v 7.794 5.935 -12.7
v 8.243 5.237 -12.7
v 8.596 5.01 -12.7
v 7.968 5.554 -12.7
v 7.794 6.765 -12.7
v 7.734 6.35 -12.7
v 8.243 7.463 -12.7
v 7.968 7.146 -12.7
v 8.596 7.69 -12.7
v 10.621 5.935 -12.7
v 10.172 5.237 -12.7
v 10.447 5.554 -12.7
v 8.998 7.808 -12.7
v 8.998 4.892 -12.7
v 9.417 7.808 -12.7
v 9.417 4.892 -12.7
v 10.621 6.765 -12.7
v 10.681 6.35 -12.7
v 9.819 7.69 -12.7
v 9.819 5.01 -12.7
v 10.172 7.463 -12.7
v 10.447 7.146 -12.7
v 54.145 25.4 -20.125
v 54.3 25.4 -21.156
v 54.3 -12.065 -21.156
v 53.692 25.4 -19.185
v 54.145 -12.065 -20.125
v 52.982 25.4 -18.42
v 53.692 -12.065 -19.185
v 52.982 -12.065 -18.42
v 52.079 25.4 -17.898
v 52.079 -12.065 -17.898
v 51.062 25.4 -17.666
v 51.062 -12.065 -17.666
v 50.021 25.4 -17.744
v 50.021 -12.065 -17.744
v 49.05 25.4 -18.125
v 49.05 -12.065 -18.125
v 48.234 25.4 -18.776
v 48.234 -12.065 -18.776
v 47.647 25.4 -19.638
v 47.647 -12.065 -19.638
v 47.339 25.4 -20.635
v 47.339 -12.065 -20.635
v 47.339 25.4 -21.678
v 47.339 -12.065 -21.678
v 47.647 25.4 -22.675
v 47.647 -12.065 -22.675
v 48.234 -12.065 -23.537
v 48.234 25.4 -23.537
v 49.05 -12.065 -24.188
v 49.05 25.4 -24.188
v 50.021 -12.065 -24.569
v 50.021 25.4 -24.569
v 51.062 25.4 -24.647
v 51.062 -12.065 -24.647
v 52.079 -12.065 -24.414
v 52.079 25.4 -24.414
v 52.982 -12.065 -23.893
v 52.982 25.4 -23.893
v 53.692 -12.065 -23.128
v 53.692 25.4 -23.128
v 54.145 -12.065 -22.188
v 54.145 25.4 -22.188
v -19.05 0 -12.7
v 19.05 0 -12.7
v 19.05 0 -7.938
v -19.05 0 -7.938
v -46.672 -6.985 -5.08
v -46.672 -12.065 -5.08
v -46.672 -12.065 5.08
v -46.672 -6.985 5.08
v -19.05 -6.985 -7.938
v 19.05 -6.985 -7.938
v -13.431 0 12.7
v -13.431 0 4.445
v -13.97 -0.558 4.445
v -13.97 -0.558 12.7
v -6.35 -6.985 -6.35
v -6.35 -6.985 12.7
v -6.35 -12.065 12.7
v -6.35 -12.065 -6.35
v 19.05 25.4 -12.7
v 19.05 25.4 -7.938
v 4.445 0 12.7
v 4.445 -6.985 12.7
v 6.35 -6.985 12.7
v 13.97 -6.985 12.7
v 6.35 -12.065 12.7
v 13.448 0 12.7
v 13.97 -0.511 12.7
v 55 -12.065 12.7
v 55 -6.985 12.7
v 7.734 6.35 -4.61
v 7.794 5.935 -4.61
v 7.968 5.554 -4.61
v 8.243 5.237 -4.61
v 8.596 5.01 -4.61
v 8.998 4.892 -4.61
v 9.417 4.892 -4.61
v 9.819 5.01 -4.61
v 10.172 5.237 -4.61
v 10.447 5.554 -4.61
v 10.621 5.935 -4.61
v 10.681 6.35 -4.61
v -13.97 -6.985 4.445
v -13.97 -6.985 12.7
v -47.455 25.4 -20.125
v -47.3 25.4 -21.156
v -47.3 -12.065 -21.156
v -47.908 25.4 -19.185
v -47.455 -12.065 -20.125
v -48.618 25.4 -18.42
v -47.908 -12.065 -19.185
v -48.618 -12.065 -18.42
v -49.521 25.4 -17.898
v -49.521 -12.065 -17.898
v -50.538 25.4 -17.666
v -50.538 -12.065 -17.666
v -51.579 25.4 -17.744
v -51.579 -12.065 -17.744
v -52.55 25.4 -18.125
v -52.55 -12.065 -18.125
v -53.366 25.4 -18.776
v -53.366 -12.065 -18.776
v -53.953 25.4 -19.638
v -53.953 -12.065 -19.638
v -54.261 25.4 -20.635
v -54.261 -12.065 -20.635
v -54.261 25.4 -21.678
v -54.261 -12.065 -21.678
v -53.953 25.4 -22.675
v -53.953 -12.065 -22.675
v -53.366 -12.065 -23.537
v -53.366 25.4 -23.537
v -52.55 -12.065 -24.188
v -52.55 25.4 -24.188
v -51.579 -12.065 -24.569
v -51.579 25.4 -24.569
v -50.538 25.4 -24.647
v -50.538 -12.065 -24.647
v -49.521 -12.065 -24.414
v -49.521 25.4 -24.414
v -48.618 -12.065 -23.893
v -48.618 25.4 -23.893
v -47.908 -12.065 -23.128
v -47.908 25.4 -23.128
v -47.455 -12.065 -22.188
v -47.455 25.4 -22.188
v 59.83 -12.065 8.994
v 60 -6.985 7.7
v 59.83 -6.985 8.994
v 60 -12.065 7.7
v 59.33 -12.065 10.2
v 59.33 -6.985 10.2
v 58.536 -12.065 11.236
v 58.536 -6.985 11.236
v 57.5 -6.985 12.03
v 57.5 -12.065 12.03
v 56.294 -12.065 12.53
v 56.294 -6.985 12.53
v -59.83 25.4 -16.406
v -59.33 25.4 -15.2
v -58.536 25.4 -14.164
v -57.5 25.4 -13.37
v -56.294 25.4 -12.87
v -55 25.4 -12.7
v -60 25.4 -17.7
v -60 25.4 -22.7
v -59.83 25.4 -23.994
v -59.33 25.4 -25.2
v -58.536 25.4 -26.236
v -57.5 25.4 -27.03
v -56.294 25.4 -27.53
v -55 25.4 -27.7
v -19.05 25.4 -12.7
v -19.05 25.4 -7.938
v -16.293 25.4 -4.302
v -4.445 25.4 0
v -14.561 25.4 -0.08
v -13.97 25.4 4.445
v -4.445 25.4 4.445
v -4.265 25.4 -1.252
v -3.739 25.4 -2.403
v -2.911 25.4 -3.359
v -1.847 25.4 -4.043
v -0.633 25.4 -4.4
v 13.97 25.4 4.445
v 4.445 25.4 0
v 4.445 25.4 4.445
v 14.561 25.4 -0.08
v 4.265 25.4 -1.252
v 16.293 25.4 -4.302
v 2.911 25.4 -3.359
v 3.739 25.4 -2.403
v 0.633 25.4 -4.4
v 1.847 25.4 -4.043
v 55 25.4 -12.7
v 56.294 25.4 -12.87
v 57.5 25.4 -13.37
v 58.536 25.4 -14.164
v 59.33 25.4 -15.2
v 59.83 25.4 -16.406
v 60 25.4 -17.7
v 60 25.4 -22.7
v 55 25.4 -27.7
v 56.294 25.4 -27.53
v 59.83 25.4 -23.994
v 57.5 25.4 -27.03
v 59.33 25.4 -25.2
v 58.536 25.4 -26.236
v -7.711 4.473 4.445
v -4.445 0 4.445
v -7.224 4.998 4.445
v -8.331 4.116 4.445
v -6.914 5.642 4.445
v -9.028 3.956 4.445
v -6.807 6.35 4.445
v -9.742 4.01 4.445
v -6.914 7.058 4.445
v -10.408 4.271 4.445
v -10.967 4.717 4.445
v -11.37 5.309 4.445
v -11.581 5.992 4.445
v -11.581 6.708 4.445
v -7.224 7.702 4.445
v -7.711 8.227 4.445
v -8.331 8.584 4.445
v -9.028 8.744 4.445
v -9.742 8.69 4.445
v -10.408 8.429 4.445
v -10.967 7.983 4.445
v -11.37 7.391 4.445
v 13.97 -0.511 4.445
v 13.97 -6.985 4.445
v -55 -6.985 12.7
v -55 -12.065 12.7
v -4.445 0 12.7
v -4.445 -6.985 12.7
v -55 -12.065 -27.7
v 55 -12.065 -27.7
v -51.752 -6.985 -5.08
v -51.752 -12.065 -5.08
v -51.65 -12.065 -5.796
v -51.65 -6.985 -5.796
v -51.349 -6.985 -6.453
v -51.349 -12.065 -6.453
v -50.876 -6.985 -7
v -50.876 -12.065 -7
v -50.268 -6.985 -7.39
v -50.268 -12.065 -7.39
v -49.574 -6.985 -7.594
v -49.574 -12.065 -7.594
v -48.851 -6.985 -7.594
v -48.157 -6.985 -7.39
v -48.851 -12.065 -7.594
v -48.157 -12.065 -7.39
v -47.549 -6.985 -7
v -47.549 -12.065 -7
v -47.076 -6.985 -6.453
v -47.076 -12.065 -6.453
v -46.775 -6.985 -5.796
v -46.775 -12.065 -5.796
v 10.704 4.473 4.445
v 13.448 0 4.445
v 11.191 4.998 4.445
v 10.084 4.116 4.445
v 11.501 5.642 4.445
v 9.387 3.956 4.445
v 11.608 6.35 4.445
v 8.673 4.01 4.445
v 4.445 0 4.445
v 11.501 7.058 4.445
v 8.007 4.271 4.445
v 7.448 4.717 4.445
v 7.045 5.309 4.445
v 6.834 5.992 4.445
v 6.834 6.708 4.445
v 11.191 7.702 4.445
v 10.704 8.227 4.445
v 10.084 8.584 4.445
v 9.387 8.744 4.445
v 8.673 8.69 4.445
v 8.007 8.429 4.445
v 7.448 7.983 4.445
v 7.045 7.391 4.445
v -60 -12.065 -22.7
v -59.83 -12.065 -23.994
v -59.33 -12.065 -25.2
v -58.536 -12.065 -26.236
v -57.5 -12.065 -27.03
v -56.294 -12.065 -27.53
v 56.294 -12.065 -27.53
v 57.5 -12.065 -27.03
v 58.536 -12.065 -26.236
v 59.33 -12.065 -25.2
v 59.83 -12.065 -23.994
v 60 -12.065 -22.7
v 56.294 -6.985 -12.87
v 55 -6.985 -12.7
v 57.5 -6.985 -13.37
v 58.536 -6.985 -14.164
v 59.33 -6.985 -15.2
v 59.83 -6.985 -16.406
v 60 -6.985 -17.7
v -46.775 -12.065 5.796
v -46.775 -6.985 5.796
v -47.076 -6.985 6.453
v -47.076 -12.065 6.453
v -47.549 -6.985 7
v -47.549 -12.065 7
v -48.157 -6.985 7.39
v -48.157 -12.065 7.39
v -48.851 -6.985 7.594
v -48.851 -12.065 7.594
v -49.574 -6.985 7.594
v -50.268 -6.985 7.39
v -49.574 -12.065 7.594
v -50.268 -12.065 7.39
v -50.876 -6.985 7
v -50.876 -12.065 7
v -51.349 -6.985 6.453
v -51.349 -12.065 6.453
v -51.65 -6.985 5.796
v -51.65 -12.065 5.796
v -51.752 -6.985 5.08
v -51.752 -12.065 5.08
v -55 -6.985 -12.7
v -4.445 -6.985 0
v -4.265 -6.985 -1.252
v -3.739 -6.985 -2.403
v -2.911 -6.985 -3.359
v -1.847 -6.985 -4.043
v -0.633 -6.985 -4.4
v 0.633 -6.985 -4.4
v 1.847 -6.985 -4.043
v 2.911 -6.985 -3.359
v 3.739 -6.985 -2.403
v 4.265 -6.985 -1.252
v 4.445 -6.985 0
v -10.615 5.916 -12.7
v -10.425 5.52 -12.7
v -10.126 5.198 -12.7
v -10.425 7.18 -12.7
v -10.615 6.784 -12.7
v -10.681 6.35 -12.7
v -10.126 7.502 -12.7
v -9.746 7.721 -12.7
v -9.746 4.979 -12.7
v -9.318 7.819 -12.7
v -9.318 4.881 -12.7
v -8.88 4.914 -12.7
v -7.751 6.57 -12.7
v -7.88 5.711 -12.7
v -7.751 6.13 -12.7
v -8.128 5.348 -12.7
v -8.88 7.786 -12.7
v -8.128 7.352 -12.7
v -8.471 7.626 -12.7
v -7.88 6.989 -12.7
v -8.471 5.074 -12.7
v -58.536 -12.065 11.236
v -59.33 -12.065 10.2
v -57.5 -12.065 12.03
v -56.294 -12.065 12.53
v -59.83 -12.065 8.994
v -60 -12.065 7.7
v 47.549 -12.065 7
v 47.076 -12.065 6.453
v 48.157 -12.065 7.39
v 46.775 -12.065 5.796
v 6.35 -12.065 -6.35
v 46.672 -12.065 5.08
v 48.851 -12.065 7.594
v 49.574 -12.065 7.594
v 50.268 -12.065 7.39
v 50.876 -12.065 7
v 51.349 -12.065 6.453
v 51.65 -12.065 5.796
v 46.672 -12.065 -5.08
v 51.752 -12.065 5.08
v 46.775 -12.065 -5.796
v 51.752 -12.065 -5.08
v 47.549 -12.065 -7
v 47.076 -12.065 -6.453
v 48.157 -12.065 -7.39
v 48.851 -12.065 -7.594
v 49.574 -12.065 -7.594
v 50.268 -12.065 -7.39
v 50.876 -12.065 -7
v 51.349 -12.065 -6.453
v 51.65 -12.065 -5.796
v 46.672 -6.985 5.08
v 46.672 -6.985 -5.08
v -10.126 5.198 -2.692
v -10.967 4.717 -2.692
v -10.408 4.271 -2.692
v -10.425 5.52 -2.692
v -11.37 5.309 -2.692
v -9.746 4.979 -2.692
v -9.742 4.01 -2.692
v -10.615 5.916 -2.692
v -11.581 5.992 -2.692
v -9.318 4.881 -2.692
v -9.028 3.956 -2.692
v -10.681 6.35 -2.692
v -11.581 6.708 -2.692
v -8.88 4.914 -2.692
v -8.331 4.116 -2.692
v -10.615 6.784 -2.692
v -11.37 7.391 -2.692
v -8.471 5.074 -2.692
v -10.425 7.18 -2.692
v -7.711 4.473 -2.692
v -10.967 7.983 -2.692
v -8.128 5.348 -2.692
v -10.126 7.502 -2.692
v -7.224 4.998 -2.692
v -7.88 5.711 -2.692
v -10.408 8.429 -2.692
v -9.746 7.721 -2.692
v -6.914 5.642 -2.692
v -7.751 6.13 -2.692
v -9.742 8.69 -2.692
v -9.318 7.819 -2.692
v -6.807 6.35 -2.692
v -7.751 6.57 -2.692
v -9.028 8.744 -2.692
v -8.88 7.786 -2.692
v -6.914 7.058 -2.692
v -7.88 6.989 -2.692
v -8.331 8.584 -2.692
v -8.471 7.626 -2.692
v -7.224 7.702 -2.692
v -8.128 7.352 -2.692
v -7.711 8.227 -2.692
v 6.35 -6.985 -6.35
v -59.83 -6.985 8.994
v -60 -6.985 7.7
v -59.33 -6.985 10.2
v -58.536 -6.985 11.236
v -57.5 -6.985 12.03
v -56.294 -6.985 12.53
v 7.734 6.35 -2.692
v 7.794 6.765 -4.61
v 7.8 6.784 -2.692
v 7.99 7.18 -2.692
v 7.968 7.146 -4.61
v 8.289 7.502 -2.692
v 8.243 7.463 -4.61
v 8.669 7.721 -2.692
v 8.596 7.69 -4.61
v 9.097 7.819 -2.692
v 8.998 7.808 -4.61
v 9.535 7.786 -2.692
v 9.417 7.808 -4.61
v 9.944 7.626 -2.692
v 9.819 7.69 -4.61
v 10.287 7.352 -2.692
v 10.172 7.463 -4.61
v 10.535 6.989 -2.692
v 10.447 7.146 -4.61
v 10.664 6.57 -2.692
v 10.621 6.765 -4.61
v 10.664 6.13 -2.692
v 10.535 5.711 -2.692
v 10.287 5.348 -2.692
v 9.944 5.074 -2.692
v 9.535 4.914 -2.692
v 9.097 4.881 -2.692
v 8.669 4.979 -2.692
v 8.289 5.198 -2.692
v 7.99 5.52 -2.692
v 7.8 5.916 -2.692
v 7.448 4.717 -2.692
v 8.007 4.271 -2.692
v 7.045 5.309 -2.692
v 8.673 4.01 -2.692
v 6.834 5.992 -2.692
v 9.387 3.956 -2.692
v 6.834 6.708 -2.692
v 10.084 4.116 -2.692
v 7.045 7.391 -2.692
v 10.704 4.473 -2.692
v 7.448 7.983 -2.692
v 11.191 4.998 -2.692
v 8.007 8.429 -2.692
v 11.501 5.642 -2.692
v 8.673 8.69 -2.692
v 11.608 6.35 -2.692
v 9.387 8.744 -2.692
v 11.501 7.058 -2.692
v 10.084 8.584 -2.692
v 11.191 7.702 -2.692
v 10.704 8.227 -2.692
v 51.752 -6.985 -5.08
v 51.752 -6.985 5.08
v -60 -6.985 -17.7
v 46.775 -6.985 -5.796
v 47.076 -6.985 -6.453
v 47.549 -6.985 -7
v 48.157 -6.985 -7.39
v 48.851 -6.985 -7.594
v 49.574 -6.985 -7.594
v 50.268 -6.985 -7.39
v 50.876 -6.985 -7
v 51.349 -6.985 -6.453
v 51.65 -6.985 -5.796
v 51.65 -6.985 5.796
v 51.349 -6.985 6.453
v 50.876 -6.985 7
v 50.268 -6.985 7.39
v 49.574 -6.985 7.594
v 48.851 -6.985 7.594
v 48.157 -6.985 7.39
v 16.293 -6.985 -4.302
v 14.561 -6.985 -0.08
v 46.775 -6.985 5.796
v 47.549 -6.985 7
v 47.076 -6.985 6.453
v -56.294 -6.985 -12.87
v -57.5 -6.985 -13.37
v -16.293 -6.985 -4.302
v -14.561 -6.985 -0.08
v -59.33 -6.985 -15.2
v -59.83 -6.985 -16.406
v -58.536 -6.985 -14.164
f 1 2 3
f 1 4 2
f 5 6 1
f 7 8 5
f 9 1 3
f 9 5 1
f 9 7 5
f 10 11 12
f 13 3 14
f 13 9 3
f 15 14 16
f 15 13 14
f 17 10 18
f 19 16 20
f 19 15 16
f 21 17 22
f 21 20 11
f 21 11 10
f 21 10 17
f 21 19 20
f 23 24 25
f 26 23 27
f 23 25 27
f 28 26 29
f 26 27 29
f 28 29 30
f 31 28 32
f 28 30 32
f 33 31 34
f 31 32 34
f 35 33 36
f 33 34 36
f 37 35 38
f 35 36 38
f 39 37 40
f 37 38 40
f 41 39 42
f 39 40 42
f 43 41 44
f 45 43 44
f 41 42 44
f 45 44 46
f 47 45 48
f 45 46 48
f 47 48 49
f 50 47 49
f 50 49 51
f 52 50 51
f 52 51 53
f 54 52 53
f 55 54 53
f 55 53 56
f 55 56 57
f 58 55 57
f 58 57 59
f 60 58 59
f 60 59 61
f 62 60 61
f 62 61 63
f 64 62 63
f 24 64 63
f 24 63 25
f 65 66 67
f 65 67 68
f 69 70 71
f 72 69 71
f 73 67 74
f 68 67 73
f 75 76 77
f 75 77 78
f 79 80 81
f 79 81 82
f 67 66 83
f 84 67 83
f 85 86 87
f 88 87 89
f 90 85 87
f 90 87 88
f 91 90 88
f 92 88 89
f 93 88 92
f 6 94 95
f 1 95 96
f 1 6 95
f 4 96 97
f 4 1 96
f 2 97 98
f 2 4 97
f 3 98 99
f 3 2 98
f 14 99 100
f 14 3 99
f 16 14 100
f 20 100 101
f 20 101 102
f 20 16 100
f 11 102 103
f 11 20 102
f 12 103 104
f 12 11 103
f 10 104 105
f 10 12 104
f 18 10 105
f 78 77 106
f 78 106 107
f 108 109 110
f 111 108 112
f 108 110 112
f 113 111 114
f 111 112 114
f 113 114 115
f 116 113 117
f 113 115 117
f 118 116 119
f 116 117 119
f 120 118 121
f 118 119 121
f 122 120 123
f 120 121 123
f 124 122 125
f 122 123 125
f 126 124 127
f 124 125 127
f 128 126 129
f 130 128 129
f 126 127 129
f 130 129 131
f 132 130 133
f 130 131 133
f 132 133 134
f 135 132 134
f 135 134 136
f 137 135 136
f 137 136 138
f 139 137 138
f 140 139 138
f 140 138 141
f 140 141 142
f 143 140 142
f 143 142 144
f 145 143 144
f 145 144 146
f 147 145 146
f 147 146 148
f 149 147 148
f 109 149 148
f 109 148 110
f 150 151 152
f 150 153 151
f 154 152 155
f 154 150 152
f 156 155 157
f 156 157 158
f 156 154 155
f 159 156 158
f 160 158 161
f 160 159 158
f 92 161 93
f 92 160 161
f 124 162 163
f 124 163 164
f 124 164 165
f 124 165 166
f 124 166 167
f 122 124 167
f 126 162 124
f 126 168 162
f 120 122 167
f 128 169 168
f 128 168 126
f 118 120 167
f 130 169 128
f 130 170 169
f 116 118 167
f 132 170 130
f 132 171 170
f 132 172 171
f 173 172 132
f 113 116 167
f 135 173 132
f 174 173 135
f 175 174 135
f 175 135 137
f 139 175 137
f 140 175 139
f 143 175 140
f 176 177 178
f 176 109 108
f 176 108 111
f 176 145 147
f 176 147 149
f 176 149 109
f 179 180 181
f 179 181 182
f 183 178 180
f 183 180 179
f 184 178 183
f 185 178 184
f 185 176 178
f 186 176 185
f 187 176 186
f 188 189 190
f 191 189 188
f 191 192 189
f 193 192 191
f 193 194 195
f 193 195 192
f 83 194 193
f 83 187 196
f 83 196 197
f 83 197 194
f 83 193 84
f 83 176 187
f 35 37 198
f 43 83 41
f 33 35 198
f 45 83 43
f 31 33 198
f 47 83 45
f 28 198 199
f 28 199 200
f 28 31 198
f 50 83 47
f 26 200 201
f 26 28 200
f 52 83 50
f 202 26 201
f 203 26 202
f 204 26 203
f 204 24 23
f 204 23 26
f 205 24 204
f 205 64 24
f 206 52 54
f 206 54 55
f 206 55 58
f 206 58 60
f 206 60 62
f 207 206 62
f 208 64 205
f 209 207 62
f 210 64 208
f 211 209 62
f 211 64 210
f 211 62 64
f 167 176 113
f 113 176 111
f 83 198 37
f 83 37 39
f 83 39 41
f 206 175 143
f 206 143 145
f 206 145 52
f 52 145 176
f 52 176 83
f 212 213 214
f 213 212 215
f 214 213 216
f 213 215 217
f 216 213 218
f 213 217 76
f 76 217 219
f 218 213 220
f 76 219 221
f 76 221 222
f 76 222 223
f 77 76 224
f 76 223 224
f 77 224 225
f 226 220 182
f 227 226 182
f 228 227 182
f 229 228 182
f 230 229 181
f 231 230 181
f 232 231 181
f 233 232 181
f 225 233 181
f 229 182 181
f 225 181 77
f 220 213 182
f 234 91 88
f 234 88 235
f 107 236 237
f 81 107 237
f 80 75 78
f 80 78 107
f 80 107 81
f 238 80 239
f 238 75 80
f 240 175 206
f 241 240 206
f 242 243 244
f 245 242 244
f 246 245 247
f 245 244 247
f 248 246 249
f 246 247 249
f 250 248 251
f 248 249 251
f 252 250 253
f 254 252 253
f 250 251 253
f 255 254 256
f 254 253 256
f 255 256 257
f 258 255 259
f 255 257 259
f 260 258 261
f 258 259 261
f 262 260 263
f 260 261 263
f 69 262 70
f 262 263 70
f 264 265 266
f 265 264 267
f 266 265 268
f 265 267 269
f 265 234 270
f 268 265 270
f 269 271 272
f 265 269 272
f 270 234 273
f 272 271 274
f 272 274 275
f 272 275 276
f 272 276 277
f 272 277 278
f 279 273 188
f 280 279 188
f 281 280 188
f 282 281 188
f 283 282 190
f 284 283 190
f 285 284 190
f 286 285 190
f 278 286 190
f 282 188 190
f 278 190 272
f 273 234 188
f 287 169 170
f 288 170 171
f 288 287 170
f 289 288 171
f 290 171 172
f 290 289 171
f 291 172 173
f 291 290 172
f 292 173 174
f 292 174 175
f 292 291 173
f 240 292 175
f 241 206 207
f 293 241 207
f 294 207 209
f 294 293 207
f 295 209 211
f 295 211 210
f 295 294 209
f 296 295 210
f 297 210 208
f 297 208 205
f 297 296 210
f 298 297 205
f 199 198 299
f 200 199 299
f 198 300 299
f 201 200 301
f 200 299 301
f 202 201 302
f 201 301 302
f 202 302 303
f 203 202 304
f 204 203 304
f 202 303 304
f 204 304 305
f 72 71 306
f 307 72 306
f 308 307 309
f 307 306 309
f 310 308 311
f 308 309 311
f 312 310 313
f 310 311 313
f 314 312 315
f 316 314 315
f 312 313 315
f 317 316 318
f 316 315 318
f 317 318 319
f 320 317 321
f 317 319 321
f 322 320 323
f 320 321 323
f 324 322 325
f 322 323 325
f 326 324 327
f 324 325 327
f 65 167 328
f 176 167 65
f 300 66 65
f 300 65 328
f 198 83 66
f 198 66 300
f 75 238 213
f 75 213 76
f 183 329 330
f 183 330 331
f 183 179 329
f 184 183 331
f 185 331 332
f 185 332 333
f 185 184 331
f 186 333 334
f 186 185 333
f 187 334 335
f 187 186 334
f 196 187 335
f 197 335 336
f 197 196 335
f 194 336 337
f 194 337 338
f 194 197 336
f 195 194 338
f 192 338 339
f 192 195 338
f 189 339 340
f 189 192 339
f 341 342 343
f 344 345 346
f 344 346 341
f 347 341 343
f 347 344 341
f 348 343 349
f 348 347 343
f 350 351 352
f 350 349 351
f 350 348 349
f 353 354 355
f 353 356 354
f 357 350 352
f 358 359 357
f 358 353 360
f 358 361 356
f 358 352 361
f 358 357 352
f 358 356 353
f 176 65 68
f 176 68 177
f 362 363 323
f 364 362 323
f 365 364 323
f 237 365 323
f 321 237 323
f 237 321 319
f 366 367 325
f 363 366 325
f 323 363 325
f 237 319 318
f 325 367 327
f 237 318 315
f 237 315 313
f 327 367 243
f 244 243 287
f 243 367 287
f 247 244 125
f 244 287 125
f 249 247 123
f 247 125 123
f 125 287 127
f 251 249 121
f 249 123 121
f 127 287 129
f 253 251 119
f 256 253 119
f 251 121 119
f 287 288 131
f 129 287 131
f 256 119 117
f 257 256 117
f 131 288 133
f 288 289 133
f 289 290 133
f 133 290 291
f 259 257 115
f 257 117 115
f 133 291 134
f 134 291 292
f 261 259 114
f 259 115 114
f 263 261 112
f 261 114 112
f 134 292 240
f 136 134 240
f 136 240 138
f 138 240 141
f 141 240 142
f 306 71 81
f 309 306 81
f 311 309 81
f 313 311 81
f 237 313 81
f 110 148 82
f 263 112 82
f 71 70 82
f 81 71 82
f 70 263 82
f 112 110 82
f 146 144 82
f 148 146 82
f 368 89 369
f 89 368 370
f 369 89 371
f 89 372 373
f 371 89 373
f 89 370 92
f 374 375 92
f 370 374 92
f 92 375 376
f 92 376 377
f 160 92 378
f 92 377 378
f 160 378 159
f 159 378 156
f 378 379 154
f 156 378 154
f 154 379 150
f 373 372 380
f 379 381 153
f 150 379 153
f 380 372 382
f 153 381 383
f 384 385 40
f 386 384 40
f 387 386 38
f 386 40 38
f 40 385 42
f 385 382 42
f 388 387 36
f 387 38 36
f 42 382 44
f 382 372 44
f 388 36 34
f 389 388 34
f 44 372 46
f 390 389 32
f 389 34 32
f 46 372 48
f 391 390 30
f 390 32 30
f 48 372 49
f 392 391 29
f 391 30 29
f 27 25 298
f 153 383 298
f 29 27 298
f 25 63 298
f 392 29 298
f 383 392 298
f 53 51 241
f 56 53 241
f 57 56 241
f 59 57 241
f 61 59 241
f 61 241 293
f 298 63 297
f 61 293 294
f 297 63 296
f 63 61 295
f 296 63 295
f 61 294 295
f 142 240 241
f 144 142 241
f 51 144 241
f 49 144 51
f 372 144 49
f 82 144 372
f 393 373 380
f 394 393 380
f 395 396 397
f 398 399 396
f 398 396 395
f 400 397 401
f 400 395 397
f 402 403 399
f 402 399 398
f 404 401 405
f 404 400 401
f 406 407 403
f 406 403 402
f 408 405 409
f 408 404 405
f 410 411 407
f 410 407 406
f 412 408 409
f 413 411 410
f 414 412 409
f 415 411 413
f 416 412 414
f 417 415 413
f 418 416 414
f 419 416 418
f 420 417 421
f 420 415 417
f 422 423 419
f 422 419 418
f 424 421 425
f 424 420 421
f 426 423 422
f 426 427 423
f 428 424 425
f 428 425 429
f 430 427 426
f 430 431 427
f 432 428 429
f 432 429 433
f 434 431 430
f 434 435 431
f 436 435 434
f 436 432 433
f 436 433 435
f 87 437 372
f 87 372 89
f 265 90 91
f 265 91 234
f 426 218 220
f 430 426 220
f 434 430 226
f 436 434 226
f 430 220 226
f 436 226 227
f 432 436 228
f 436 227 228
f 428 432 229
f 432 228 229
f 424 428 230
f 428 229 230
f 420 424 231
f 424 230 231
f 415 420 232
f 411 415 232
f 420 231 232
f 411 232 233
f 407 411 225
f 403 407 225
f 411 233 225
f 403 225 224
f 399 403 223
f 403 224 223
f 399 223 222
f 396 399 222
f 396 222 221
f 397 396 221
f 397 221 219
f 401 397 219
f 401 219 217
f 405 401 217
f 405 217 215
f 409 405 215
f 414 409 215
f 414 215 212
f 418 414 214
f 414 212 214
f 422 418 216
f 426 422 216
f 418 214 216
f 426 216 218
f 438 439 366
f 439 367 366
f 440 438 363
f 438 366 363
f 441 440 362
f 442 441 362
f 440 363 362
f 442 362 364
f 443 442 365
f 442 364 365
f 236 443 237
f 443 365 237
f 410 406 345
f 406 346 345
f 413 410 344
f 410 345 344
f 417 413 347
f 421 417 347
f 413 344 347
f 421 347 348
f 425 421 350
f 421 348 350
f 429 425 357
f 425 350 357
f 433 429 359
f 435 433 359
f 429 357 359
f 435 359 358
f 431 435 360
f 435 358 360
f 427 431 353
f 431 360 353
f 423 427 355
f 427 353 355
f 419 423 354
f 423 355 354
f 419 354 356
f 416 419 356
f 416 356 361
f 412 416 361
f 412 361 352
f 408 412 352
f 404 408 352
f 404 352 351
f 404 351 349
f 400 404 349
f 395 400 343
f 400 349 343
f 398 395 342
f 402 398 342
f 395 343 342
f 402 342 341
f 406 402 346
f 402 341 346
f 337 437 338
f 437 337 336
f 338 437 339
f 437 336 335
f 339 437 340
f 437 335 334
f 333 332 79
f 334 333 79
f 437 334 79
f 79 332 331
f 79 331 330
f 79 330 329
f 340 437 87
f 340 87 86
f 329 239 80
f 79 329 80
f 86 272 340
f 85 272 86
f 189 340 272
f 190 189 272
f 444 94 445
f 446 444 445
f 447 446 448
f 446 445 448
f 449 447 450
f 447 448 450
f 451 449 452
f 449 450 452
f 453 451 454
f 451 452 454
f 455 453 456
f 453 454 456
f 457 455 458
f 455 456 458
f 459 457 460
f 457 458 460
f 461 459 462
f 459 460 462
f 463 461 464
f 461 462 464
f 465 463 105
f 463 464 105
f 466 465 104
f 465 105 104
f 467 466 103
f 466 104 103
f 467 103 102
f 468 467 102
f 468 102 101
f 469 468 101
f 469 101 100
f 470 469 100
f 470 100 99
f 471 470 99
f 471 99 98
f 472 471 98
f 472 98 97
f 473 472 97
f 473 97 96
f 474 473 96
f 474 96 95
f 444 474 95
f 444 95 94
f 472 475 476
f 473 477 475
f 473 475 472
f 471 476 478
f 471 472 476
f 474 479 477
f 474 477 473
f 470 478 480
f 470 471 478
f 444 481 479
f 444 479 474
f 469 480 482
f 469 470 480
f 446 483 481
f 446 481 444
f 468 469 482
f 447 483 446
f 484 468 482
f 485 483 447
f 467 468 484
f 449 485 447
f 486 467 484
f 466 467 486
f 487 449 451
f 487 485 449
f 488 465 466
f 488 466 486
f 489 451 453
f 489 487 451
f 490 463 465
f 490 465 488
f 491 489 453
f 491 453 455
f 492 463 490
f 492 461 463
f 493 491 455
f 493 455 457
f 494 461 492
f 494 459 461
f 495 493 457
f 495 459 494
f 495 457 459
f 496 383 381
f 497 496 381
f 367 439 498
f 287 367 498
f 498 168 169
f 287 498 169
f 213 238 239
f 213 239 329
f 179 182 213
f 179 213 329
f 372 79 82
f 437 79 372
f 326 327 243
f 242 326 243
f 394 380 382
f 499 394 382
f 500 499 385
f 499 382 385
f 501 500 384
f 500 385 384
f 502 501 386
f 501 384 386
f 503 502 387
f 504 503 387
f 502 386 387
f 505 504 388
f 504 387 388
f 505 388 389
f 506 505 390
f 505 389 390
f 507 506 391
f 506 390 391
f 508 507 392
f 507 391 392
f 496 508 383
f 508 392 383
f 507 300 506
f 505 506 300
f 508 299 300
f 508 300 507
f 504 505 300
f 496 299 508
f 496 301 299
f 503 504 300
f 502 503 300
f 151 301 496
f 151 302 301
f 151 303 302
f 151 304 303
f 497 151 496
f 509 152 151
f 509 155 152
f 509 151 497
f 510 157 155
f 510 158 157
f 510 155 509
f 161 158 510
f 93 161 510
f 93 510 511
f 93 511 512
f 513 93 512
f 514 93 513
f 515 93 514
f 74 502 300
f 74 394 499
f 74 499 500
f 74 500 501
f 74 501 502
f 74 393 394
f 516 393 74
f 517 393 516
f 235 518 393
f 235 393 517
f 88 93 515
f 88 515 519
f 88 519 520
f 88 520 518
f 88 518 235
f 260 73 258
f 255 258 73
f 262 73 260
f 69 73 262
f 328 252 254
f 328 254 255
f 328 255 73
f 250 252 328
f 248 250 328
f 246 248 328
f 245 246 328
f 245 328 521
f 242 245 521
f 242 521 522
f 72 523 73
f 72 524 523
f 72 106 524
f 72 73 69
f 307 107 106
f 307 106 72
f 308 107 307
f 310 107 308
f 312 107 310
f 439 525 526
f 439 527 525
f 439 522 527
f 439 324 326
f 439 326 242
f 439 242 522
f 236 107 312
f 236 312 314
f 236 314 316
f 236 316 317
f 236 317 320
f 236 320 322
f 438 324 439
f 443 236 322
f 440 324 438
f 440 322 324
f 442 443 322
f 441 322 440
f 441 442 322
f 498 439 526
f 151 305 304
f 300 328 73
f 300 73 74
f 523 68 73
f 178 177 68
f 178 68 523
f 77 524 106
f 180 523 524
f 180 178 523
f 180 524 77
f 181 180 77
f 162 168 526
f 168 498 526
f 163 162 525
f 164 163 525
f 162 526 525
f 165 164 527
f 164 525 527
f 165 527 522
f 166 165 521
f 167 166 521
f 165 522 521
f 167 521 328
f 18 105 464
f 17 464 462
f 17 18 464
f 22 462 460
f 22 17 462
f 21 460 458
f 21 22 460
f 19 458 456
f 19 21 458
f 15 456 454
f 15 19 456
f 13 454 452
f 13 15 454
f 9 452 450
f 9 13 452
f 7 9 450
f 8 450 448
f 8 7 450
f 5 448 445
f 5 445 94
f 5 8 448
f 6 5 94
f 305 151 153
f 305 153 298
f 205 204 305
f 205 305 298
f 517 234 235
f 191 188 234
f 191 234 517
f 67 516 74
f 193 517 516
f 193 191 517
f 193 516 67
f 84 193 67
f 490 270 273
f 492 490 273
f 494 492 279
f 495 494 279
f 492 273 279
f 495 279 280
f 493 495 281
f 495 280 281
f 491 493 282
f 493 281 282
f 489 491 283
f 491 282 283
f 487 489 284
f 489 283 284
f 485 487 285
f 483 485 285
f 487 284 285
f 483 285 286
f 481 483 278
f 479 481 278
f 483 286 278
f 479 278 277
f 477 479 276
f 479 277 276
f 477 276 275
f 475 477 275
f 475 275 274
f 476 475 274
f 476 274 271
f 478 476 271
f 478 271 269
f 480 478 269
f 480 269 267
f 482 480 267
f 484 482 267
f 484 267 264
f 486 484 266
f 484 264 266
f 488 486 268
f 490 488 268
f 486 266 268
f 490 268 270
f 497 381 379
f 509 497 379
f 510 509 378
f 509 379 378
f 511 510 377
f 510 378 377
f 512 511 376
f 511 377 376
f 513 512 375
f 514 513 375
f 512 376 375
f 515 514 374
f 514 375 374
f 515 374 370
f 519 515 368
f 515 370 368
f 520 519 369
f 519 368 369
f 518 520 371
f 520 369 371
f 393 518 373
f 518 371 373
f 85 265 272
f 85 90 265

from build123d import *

# Parameters (mm, degrees)
SKETCH1_W                  = 38.1
SKETCH1_H                  = 25.4
BOSS_EXTRUDE1_DEPTH        = 25.0825
CUT_EXTRUDE3_DEPTH         = 26.4
CUT_EXTRUDE4_DEPTH         = 26.4
CUT_EXTRUDE5_DEPTH         = 26.4
BOSS_EXTRUDE2_DEPTH        = 6.985
BOSS_EXTRUDE3_DEPTH        = 5.08
SKETCH29_W                 = 19.05
SKETCH29_H                 = 5.08
CUT_EXTRUDE6_DEPTH         = 1.905
SKETCH30_W                 = 19.05
SKETCH30_H                 = 5.08
CUT_EXTRUDE7_DEPTH         = 1.905
CUT_EXTRUDE10_REACH        = 39.465
CUT_EXTRUDE11_REACH        = 39.465
SKETCH77_W                 = 1.4732
SKETCH77_H                 = 16.0274
M2_5_CLEARANCE_HOLE1_D     = 2.9464
M2_5_CLEARANCE_HOLE1_DEPTH = 25.0825
CHAMFER1_SIZE              = 0.511100582
CHAMFER1_SIZE2             = 0.522104304
CHAMFER2_SIZE              = 0.558247665
CHAMFER2_SIZE2             = 0.538663646
SKETCH80_W                 = 38.1
SKETCH80_H                 = 25.4
CUT_EXTRUDE13_DEPTH        = 7.9375
SKETCH81_W                 = 120
SKETCH81_H                 = 15
BOSS_EXTRUDE4_DEPTH        = 37.465
SKETCH82_R                 = 3.5
CUT_EXTRUDE14_DEPTH        = 38.465
FILLET3_R                  = 5
FILLET4_R                  = 5
FILLET5_R                  = 5
SKETCH83_R                 = 2.4003
CUT_EXTRUDE15_DEPTH        = 7.1374


with BuildPart() as part:
    # Sketch1 → Boss-Extrude1 (new body)
    with BuildSketch(Plane(origin=(0, 0, -20.6375), x_dir=(-1, 0, 0), z_dir=(0, 0, -1))):
        with Locations((0, 12.7)):
            Rectangle(SKETCH1_W, SKETCH1_H)
    extrude(amount=-BOSS_EXTRUDE1_DEPTH)

    # Sketch18 → Cut-Extrude3 (cut, through all)
    with BuildSketch(Plane(origin=(0, 0, 0), x_dir=(-1, 0, 0), z_dir=(0, -1, 0))):
        with BuildLine():
            Line((13.97, -4.445), (19.05, -4.445))
            Line((19.05, -4.445), (19.05, 7.9375))
            ThreePointArc((19.05, 7.9375), (15.289364951, 2.247023353), (13.97, -4.445))
        make_face()
    extrude(amount=-CUT_EXTRUDE3_DEPTH, mode=Mode.SUBTRACT)

    # Sketch19 → Cut-Extrude4 (cut, through all)
    with BuildSketch(Plane.XZ):
        with BuildLine():
            Line((4.445, 4.445), (-4.445, 4.445))
            Line((-4.445, 4.445), (-4.445, 0))
            ThreePointArc((-4.445, 0), (0, -4.445), (4.445, 0))
            Line((4.445, 0), (4.445, 4.445))
        make_face()
    extrude(amount=-CUT_EXTRUDE4_DEPTH, mode=Mode.SUBTRACT)

    # Sketch20 → Cut-Extrude5 (cut, through all)
    with BuildSketch(Plane.XZ):
        with BuildLine():
            Line((19.05, -7.9375), (19.05, 4.445))
            Line((19.05, 4.445), (13.97, 4.445))
            ThreePointArc((13.97, 4.445), (15.289364951, -2.247023353), (19.05, -7.9375))
        make_face()
    extrude(amount=-CUT_EXTRUDE5_DEPTH, mode=Mode.SUBTRACT)

    # Sketch21 → Boss-Extrude2 (add)
    with BuildSketch(Plane.XZ):
        with BuildLine():
            Line((4.445, 0), (4.445, 12.7))
            Line((4.445, 12.7), (13.97, 12.7))
            Line((13.97, 12.7), (13.97, 4.445))
            ThreePointArc((13.97, 4.445), (15.289364951, -2.247023353), (19.05, -7.9375))
            Line((19.05, -7.9375), (-19.05, -7.9375))
            ThreePointArc((-19.05, -7.9375), (-15.289364951, -2.247023353), (-13.97, 4.445))
            Line((-13.97, 4.445), (-13.97, 12.7))
            Line((-13.97, 12.7), (-4.445, 12.7))
            Line((-4.445, 12.7), (-4.445, 0))
            ThreePointArc((-4.445, 0), (0, -4.445), (4.445, 0))
        make_face()
    extrude(amount=BOSS_EXTRUDE2_DEPTH)

    # Sketch22 → Boss-Extrude3 (add)
    with BuildSketch(Plane.XZ.offset(6.985)):
        Polygon((-4.445, -6.35), (4.445, -6.35), (4.445, 12.7), (60, 12.7), (60, -12.7), (-60, -12.7), (-60, 12.7), (-4.445, 12.7), align=None)
    extrude(amount=BOSS_EXTRUDE3_DEPTH)

    # Sketch29 → Cut-Extrude6 (cut)
    with BuildSketch(Plane.ZY.offset(-4.445)):
        with Locations((3.175, -9.525)):
            Rectangle(SKETCH29_W, SKETCH29_H)
    extrude(amount=-CUT_EXTRUDE6_DEPTH, mode=Mode.SUBTRACT)

    # Sketch30 → Cut-Extrude7 (cut)
    with BuildSketch(Plane(origin=(-4.445, 0, 0), x_dir=(0, 0, -1), z_dir=(1, 0, 0))):
        with Locations((-3.175, -9.525)):
            Rectangle(SKETCH30_W, SKETCH30_H)
    extrude(amount=-CUT_EXTRUDE7_DEPTH, mode=Mode.SUBTRACT)

    # Sketch48 → Cut-Extrude10 (cut, up to next)
    with BuildSketch(Plane(origin=(0, -12.065, 0), x_dir=(-1, 0, 0), z_dir=(0, -1, 0)), mode=Mode.PRIVATE) as cut_extrude10_sk1:
        with BuildLine():
            Line((-51.7525, 5.08), (-51.7525, -5.08))
            ThreePointArc((-51.7525, -5.08), (-49.2125, -7.62), (-46.6725, -5.08))
            Line((-46.6725, -5.08), (-46.6725, 5.08))
            ThreePointArc((-46.6725, 5.08), (-49.2125, 7.62), (-51.7525, 5.08))
        make_face()
    cut_extrude10_tool1 = extrude(cut_extrude10_sk1.sketch, amount=-CUT_EXTRUDE10_REACH, mode=Mode.PRIVATE) & part.part
    add(cut_extrude10_tool1.solids().sort_by_distance((49.2125, -12.065, 0))[0], mode=Mode.SUBTRACT)

    # Sketch57 → Cut-Extrude11 (cut, up to next)
    with BuildSketch(Plane(origin=(0, -12.065, 0), x_dir=(-1, 0, 0), z_dir=(0, -1, 0)), mode=Mode.PRIVATE) as cut_extrude11_sk1:
        with BuildLine():
            Line((46.6725, 5.08), (46.6725, -5.08))
            ThreePointArc((46.6725, -5.08), (49.2125, -7.62), (51.7525, -5.08))
            Line((51.7525, -5.08), (51.7525, 5.08))
            ThreePointArc((51.7525, 5.08), (49.2125, 7.62), (46.6725, 5.08))
        make_face()
    cut_extrude11_tool1 = extrude(cut_extrude11_sk1.sketch, amount=-CUT_EXTRUDE11_REACH, mode=Mode.PRIVATE) & part.part
    add(cut_extrude11_tool1.solids().sort_by_distance((-49.2125, -12.065, 0))[0], mode=Mode.SUBTRACT)

    # Sketch77 → Cut-Revolve2 (revolve, cut)
    with BuildSketch(Plane(origin=(0, 6.35, 0), x_dir=(1, 0, 0), z_dir=(0, 1, 0))):
        with Locations((9.9441, 12.6238)):
            Rectangle(SKETCH77_W, SKETCH77_H)
    revolve(axis=Axis((9.2075, 6.35, -20.6375), (0, 0, 1)), mode=Mode.SUBTRACT)

    # M2.5 Clearance Hole1
    with Locations(Plane.XY.offset(4.445)):
        with Locations((9.2075, 6.35), (-9.2075, 6.35)):
            Hole(M2_5_CLEARANCE_HOLE1_D / 2, depth=M2_5_CLEARANCE_HOLE1_DEPTH)

    # Chamfer1
    chamfer1_edges = [part.edges().sort_by_distance(p)[0] for p in [
        (13.97, 0, 8.5725),
    ]]
    chamfer1_side = [part.faces().sort_by_distance(p)[0] for p in [
        (13.97, -3.4925, 8.5725),
    ]]
    chamfer(chamfer1_edges, length=CHAMFER1_SIZE, length2=CHAMFER1_SIZE2, reference=chamfer1_side[0])

    # Chamfer2
    chamfer2_edges = [part.edges().sort_by_distance(p)[0] for p in [
        (-13.97, 0, 8.5725),
    ]]
    chamfer2_side = [part.faces().sort_by_distance(p)[0] for p in [
        (-13.97, -3.4925, 8.5725),
    ]]
    chamfer(chamfer2_edges, length=CHAMFER2_SIZE, length2=CHAMFER2_SIZE2, reference=chamfer2_side[0])

    # Sketch80 → Cut-Extrude13 (cut)
    with BuildSketch(Plane(origin=(0, 0, -20.6375), x_dir=(-1, 0, 0), z_dir=(0, 0, -1))):
        with Locations((0, 12.7)):
            Rectangle(SKETCH80_W, SKETCH80_H)
    extrude(amount=-CUT_EXTRUDE13_DEPTH, mode=Mode.SUBTRACT)

    # Sketch81 → Boss-Extrude4 (add)
    with BuildSketch(Plane(origin=(0, 25.4, 0), x_dir=(1, 0, 0), z_dir=(0, 1, 0))):
        with Locations((0, 20.2)):
            Rectangle(SKETCH81_W, SKETCH81_H)
    extrude(amount=-BOSS_EXTRUDE4_DEPTH)

    # Sketch82 → Cut-Extrude14 (cut, through all)
    with BuildSketch(Plane.XZ.offset(12.065)):
        with Locations((-50.8, -21.156433146)):
            Circle(SKETCH82_R)
        with Locations((50.8, -21.156433146)):
            Circle(SKETCH82_R)
    extrude(amount=-CUT_EXTRUDE14_DEPTH, mode=Mode.SUBTRACT)

    # Fillet3
    fillet3_edges = [part.edges().sort_by_distance(p)[0] for p in [
        (60, 6.6675, -27.7),
        (-60, 6.6675, -27.7),
    ]]
    fillet(fillet3_edges, radius=FILLET3_R)

    # Fillet4
    fillet4_edges = [part.edges().sort_by_distance(p)[0] for p in [
        (60, 9.2075, -12.7),
        (-60, 9.2075, -12.7),
    ]]
    fillet(fillet4_edges, radius=FILLET4_R)

    # Fillet5
    fillet5_edges = [part.edges().sort_by_distance(p)[0] for p in [
        (-60, -9.525, 12.7),
        (60, -9.525, 12.7),
    ]]
    fillet(fillet5_edges, radius=FILLET5_R)

    # Sketch83 → Cut-Extrude15 (cut)
    with BuildSketch(Plane.XY.offset(4.445)):
        with Locations((-9.2075, 6.35)):
            Circle(SKETCH83_R)
        with Locations((9.2075, 6.35)):
            Circle(SKETCH83_R)
    extrude(amount=-CUT_EXTRUDE15_DEPTH, mode=Mode.SUBTRACT)


solid = part.part
